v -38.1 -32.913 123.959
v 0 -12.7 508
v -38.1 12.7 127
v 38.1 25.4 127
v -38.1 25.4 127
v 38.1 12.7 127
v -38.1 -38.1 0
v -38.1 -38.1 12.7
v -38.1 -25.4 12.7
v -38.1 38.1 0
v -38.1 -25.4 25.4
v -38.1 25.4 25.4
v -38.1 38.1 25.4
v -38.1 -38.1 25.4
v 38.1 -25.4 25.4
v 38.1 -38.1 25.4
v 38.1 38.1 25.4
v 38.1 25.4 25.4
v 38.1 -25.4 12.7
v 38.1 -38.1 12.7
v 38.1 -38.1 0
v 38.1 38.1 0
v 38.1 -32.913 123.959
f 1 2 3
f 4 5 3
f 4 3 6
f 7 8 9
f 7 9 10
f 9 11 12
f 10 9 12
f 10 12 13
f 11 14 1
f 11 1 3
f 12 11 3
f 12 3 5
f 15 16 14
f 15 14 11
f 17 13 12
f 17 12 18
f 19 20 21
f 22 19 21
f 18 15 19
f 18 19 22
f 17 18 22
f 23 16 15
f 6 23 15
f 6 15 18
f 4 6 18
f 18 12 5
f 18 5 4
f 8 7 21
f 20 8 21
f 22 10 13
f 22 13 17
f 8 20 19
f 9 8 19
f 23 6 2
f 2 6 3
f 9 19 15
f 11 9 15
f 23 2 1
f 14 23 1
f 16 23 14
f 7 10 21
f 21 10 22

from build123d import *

# Parameters (mm, degrees)
F0_W      = 76.2
F0_H      = 76.2
F1_DEPTH  = 25.4
F2_W      = 76.2
F2_H      = 12.7
F3_DEPTH  = 101.6
F6_DEPTH  = 76.2
F7_W      = 12.7
F7_H      = 12.7
F8_DEPTH  = 76.201
F10_DEPTH = 59.1364003556
F12_DEPTH = 59.1364003556


with BuildPart() as f1:
    # F0 (on Top) → F1 (new body)
    with BuildSketch(Plane.XY):
        Rectangle(F0_W, F0_H)
    extrude(amount=F1_DEPTH)

    # F2 (on face) → F3 (join)
    with BuildSketch(Plane.XY.offset(25.4)):
        with Locations((0, 19.05)):
            Rectangle(F2_W, F2_H)
    extrude(amount=F3_DEPTH)

    # F5 (on face) → F6 (join, through all)
    with BuildSketch(Plane.YZ.offset(38.1)):
        Polygon((-38.1, 25.4), (12.7, 25.4), (12.7, 127), (-12.7, 508), align=None)
    extrude(amount=-F6_DEPTH)

    # F7 (on face) → F8 (cut, through all)
    with BuildSketch(Plane.YZ.offset(38.1)):
        with Locations((-31.75, 19.05)):
            Rectangle(F7_W, F7_H)
    extrude(amount=-F8_DEPTH, mode=Mode.SUBTRACT)

    # F9 (on face) → F10 (cut, through all)
    with BuildSketch(Plane(origin=(0, 21.0730088496, 1.4048672566), x_dir=(-1, 0, 0), z_dir=(0, 0.9977851579, 0.0665190105))):
        Polygon((-38.1, 125.8739236141), (0, 507.7196516248), (-38.1, 507.7196516248), align=None)
    extrude(amount=-F10_DEPTH, mode=Mode.SUBTRACT)

    # F11 (on face) → F12 (cut, through all)
    with BuildSketch(Plane(origin=(0, 21.0730088496, 1.4048672566), x_dir=(-1, 0, 0), z_dir=(0, 0.9977851579, 0.0665190105))):
        Polygon((38.1, 507.7196516248), (0, 507.7196516248), (38.1, 125.8739236141), align=None)
    extrude(amount=-F12_DEPTH, mode=Mode.SUBTRACT)


solid = f1.part
